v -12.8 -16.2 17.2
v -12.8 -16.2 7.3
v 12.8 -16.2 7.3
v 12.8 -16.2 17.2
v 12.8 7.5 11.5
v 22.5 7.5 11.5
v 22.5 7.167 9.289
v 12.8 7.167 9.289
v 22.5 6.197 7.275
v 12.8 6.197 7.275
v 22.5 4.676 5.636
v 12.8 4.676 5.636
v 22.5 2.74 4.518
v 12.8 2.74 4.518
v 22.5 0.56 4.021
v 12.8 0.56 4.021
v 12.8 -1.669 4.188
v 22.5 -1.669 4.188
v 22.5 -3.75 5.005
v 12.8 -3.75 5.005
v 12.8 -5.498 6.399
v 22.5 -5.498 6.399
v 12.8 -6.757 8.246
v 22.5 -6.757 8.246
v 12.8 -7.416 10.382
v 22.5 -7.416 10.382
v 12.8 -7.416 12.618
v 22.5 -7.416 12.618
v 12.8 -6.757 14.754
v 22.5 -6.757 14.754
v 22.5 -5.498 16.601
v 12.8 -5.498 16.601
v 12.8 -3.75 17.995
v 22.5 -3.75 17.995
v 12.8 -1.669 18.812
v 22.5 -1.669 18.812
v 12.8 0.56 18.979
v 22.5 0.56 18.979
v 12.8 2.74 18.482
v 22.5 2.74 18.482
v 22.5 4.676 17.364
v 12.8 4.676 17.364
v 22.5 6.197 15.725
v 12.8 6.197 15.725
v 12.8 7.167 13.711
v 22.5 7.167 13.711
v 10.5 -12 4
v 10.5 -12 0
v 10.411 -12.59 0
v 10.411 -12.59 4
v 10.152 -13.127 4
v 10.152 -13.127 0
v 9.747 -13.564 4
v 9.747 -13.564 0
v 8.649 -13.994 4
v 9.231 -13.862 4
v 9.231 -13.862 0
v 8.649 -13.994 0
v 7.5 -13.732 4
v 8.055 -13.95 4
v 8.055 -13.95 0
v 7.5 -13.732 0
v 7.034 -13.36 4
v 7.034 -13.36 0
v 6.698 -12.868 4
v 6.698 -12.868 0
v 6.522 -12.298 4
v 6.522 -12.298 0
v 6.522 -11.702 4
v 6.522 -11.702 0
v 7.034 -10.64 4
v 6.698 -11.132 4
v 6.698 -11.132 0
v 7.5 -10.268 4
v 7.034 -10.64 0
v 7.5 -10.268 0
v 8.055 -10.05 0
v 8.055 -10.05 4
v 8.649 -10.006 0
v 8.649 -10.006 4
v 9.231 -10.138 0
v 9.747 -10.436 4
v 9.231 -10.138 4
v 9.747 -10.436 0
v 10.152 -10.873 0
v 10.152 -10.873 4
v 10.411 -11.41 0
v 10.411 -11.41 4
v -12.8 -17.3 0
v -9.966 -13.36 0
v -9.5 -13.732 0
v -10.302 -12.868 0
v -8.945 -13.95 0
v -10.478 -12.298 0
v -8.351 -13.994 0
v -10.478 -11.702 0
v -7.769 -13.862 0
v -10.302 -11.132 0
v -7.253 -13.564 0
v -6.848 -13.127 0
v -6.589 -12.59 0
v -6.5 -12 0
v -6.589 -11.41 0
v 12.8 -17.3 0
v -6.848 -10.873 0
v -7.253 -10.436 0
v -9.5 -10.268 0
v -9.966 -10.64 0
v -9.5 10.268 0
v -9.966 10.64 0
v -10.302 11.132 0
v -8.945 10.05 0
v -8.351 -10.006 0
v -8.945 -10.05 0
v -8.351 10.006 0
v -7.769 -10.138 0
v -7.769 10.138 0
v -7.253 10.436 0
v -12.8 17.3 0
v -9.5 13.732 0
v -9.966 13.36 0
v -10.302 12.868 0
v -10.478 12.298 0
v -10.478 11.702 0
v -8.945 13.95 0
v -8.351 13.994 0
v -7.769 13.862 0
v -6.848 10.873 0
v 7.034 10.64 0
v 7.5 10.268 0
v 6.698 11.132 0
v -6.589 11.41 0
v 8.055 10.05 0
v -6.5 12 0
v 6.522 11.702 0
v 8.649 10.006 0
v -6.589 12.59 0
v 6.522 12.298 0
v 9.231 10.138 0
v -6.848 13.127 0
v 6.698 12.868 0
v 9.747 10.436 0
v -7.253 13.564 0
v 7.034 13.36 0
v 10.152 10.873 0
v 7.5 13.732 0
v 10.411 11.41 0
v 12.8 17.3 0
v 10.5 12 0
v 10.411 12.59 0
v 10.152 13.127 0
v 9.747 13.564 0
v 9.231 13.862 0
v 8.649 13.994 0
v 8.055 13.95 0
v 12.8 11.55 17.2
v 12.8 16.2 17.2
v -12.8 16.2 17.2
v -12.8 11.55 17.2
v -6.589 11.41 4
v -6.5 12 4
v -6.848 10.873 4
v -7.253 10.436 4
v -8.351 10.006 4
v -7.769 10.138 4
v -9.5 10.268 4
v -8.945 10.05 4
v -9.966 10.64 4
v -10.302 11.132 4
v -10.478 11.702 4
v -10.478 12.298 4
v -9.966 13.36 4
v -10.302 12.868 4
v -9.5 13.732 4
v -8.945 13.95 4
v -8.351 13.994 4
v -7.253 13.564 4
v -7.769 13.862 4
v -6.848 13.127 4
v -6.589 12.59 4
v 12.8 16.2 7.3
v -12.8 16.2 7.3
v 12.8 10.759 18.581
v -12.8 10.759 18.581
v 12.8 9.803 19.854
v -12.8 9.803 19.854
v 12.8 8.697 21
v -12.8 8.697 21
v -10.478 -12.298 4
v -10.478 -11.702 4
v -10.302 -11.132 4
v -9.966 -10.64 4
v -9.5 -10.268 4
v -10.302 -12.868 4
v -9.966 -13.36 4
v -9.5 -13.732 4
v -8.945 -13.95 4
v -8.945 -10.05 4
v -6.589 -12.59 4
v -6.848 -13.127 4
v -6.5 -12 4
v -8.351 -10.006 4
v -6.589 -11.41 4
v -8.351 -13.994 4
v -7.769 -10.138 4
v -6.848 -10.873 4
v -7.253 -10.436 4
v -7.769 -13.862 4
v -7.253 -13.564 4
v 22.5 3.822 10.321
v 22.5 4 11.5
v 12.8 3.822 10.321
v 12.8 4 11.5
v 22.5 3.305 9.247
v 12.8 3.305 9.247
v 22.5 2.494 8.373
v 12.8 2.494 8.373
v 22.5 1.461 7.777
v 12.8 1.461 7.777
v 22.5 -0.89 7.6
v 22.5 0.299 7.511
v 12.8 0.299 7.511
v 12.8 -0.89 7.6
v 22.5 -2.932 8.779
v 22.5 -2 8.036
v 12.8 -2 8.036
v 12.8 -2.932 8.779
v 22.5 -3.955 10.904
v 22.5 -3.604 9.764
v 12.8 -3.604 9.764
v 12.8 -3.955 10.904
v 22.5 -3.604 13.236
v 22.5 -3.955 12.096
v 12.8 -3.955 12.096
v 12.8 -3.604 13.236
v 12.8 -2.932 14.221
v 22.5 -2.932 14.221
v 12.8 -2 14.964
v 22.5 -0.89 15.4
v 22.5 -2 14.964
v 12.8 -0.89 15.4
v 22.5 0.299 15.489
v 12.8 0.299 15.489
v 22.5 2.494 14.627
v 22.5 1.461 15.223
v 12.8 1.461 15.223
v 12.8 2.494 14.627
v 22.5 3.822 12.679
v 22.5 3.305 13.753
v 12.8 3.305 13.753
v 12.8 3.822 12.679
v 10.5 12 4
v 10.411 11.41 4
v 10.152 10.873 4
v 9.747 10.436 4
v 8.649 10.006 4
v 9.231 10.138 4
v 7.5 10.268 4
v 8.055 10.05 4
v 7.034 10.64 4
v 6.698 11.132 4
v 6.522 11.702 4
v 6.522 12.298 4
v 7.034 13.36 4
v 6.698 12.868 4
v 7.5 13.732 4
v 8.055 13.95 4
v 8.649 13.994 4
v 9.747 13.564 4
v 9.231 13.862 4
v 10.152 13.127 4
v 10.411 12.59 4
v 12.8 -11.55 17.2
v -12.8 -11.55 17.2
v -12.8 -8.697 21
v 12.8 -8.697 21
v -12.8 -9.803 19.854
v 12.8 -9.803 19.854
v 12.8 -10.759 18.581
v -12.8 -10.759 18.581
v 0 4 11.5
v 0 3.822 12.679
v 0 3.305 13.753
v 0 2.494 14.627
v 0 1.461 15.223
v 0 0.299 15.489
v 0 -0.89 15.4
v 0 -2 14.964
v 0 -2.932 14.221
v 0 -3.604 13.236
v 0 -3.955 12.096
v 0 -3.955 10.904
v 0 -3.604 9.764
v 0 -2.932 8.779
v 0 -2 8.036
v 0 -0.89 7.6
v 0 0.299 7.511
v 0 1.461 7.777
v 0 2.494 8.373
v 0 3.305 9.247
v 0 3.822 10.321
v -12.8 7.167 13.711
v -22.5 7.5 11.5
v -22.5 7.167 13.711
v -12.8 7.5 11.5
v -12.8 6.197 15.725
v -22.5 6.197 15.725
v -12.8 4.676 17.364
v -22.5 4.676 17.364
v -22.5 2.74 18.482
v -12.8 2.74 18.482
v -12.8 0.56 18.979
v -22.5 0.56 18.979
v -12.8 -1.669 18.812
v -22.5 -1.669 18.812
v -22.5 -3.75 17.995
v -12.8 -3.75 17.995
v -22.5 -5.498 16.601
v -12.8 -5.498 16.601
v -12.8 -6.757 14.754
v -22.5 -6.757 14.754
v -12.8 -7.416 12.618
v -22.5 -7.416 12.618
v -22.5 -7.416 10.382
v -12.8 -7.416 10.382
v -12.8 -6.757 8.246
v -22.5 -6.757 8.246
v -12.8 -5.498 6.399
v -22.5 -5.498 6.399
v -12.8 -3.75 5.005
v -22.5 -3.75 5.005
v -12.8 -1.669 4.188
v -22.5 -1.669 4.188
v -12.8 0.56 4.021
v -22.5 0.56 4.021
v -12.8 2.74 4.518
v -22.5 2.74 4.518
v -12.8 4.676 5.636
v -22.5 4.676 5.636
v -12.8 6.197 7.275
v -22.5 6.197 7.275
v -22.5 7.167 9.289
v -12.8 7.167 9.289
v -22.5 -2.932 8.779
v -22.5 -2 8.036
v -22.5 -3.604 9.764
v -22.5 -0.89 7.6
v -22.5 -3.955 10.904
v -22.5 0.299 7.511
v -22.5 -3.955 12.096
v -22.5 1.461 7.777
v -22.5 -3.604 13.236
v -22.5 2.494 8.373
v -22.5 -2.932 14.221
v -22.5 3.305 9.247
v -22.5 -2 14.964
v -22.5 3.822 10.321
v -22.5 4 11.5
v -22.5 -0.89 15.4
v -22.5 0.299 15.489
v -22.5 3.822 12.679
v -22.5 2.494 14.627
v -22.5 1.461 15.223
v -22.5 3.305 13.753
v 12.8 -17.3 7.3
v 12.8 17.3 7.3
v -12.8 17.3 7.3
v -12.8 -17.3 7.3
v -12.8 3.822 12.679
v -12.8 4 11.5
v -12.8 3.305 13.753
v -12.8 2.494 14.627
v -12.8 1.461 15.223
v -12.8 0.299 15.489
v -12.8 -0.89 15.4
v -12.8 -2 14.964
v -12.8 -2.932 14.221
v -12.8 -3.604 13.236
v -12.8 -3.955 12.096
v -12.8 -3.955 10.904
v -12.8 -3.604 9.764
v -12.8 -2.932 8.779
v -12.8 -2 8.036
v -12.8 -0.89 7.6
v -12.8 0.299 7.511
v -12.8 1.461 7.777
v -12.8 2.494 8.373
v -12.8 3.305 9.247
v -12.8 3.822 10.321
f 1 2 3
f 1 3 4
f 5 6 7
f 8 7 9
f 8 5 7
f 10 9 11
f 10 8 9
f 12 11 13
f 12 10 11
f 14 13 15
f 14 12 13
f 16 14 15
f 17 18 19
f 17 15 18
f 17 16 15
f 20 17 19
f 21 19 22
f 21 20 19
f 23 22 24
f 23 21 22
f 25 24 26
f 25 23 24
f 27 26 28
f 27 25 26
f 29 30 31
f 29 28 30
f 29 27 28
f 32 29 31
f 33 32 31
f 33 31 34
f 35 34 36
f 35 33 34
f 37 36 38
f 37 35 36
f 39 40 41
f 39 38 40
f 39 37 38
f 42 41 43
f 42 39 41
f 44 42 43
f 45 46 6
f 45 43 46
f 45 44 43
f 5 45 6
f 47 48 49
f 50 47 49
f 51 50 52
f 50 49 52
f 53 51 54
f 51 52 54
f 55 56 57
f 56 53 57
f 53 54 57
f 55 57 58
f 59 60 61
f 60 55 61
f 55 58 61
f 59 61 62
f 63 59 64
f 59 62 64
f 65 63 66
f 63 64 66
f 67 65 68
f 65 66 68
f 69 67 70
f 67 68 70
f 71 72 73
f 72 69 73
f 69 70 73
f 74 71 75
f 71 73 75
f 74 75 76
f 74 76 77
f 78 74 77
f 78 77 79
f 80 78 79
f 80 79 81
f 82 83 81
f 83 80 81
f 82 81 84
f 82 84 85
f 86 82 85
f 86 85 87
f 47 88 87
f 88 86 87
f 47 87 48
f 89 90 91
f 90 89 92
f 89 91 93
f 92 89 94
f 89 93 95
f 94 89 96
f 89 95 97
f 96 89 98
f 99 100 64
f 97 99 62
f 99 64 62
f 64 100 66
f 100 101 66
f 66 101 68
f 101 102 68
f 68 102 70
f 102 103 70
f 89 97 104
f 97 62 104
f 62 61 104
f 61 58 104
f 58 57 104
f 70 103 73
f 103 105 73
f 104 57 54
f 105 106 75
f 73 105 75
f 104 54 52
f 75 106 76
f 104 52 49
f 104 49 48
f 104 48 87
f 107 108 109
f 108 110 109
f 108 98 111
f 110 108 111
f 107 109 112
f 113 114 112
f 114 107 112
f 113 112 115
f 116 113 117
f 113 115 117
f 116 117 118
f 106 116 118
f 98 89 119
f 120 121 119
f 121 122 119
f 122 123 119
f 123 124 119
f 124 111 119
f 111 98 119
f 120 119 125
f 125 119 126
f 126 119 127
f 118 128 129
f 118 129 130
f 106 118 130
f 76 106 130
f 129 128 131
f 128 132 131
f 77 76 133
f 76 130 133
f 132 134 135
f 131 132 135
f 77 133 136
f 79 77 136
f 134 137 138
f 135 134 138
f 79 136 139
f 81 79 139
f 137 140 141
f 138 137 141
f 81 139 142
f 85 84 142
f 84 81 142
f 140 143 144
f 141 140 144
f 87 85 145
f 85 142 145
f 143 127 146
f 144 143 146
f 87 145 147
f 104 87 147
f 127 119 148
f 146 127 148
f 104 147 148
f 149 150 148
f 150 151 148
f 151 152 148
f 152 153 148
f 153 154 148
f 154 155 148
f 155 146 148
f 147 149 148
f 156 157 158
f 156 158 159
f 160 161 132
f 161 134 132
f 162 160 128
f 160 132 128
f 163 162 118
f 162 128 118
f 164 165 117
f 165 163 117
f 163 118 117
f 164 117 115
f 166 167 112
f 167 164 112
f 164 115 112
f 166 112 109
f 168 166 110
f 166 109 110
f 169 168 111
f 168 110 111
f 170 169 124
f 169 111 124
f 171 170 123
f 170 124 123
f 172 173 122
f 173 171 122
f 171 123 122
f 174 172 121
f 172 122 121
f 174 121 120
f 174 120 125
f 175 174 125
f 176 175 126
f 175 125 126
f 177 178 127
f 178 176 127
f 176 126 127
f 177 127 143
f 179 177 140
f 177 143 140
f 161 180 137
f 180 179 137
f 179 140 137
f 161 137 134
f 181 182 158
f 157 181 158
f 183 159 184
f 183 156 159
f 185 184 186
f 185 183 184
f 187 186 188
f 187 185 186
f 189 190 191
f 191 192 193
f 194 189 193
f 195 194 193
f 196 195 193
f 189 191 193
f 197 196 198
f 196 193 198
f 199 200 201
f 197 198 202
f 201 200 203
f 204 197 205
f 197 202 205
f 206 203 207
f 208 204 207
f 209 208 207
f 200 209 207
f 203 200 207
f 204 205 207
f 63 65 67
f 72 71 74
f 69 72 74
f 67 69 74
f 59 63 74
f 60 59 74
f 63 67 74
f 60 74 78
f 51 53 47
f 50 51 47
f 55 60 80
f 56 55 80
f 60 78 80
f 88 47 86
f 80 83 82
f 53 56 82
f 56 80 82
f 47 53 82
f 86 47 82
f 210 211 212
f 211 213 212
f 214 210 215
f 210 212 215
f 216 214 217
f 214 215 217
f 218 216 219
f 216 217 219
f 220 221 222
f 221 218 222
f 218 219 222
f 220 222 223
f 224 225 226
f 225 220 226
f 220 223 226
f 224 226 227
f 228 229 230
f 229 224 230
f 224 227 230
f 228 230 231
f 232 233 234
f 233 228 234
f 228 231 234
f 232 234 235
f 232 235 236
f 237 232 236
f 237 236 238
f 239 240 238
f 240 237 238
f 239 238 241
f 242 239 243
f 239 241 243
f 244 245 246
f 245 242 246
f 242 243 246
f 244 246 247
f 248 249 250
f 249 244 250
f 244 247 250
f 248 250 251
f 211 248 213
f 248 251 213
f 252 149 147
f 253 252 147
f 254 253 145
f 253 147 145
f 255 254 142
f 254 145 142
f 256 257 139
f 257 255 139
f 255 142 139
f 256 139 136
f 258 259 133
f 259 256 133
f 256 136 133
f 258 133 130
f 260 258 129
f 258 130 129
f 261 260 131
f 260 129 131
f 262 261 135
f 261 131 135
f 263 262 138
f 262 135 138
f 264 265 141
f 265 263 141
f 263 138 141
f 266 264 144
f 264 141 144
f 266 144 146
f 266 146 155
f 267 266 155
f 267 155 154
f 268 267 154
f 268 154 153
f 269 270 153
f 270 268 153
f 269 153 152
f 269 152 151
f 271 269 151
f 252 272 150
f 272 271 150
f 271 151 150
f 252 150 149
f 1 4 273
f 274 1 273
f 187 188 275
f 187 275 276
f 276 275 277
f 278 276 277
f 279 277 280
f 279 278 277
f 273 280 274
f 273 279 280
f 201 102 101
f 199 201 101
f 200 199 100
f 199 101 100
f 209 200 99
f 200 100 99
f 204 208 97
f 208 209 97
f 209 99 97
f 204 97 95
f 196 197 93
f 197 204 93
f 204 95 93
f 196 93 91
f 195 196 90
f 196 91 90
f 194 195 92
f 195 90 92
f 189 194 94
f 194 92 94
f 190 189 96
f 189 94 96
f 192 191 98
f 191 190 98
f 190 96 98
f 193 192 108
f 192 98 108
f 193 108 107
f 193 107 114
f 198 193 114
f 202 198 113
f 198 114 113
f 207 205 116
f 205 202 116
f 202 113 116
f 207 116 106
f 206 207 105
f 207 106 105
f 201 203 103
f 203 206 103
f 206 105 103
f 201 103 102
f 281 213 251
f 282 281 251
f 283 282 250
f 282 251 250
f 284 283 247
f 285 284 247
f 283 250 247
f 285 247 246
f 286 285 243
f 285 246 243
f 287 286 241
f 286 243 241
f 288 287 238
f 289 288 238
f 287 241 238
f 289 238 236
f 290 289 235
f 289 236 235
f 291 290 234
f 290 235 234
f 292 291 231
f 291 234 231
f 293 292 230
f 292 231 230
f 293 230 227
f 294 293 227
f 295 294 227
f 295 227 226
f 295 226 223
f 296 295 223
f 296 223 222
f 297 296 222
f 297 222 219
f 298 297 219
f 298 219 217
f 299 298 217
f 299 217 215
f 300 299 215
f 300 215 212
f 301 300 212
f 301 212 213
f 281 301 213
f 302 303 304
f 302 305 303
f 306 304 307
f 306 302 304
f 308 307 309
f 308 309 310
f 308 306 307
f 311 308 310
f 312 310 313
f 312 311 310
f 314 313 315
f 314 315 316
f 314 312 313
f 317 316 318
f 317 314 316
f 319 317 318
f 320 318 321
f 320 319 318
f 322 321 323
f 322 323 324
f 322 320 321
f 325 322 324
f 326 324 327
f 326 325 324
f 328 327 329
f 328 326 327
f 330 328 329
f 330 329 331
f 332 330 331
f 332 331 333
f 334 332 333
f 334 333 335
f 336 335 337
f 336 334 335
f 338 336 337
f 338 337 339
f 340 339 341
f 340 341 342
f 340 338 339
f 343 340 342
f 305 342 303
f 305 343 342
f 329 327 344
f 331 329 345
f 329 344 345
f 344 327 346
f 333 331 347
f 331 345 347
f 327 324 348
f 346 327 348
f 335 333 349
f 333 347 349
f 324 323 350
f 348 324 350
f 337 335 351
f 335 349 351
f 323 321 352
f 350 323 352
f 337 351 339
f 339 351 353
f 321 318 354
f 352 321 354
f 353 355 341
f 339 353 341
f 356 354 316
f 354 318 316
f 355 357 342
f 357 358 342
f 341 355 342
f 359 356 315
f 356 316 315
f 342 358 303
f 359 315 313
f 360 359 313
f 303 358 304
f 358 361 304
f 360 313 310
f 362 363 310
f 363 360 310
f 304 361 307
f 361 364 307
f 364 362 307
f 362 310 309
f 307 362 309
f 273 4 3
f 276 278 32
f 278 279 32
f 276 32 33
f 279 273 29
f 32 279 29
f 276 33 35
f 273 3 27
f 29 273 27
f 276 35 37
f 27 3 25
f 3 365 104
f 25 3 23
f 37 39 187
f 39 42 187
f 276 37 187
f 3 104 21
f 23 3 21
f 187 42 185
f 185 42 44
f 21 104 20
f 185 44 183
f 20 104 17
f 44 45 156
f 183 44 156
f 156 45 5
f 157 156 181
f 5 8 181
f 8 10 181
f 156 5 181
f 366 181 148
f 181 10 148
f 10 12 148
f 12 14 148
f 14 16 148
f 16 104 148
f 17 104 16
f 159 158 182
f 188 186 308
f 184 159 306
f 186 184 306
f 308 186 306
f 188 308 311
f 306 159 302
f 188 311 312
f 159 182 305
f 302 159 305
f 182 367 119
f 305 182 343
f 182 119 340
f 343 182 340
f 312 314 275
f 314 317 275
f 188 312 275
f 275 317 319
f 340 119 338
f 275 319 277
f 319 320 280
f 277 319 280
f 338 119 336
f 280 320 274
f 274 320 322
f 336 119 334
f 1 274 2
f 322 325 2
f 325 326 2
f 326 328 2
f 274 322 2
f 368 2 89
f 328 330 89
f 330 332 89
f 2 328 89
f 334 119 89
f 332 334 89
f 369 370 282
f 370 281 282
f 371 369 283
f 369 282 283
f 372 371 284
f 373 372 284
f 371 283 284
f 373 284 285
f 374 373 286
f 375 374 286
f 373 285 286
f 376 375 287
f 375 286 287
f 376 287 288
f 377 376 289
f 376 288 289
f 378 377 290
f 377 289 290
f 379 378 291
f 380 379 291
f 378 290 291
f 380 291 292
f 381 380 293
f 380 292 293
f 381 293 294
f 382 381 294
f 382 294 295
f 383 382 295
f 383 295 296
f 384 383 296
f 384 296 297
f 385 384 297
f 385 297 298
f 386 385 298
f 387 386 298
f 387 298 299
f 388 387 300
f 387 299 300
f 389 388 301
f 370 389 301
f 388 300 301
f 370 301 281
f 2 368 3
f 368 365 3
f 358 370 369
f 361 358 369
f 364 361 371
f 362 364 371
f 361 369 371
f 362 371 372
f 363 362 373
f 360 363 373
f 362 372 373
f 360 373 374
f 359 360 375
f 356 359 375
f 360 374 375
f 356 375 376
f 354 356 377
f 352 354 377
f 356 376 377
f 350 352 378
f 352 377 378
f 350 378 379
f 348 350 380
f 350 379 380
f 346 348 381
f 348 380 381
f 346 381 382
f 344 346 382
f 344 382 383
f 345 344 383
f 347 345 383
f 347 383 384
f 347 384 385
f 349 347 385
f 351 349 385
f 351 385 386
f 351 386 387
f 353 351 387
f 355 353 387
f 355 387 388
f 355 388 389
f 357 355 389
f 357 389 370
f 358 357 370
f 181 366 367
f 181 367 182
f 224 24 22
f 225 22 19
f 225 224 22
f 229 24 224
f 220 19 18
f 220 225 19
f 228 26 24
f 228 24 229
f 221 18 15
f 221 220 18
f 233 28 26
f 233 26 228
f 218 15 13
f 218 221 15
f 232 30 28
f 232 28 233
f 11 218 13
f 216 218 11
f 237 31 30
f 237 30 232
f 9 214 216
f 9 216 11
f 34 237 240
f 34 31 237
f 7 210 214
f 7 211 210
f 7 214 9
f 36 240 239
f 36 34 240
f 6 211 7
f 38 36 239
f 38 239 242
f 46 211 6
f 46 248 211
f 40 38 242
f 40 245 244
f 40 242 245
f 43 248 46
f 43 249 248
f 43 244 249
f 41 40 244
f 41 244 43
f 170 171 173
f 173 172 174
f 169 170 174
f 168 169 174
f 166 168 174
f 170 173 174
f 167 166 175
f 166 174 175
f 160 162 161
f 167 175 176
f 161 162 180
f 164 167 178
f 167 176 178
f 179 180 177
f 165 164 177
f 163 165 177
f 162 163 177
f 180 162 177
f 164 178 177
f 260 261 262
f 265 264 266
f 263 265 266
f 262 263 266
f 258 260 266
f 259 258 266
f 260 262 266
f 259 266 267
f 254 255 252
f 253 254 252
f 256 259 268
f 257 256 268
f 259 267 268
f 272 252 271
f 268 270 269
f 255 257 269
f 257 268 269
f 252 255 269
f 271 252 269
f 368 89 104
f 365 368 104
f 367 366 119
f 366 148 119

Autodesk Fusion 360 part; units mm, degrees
sketch "Base" plane through (0, 0, 0) normal (0, 0, 1) x (1, 0, 0) in component "X Bearing Blocks"
  line L0 (12.8, 17.3) -> (-12.8, 17.3)
  line L1 (-12.8, 17.3) -> (-12.8, -17.3)
  line L2 (-12.8, -17.3) -> (12.8, -17.3)
  line L3 (12.8, -17.3) -> (12.8, 17.3)
  line L4 (12.8, 17.3) -> (-12.8, -17.3) construction
  line L5 (-12.8, 17.3) -> (12.8, -17.3) construction
  line L6 (-12.8, 0) -> (12.8, 0) construction
  line L7 (-12.8, 14.125) -> (12.8, 14.125)
  line L8 (-12.8, 9.875) -> (12.8, 9.875)
  line L9 (-12.8, 12) -> (12.8, 12) construction
  circle A0 centre (-8.5, 12) radius 2
  circle A1 centre (8.5, 12) radius 2
  line L10 (0, 17.3) -> (0, -17.3) construction
  line L11 (-12.8, -14.125) -> (12.8, -14.125)
  circle A2 centre (-8.5, -12) radius 2
  circle A3 centre (8.5, -12) radius 2
  line L12 (-12.8, -9.875) -> (12.8, -9.875)
  dimension "d484_1" = 25.6
  dimension "d485_1" = 34.6
  dimension "d489_1" = 4
  dimension "d490_1" = 4
  dimension "d491_1" = 12
  dimension "d492_1" = 17
  dimension "d493_1" = 8.5
  dimension "d495_1" = 2.125
  dimension "d496_1" = 2.125
extrude "Extrude1" add sketch "Base" along normal blind 21 contours L0 L1 L3 L7 | L1 L3 L7 L8 | L1 L3 L8 L12 | L1 L3 L11 L12 | L1 L2 L3 L11 | A0 | A1 | A2 | A3 in component "X Bearing Blocks"
sketch "Face" plane through (12.8, 0, 0) normal (1, 0, 0) x (0, 1, 0) in component "X Bearing Blocks"
  line L0 (-17.3, 0) -> (17.3, 0)
  line L1 (17.3, 0) -> (17.3, 21)
  line L2 (17.3, 21) -> (-17.3, 21)
  line L3 (-17.3, 21) -> (-17.3, 0)
  line L4 (0, 0) -> (0, 21) construction
  circle A0 centre (0, 11.5) radius 7.5
  circle A1 centre (0, 11.5) radius 4
  line L5 (-17.3, 0) -> (-17.3, 7.3)
  line L6 (-17.3, 7.3) -> (-16.2, 7.3)
  line L7 (-16.2, 7.3) -> (-16.2, 17.2)
  line L8 (-16.2, 17.2) -> (-11.55, 17.2)
  line L9 (17.3, 0) -> (17.3, 7.3)
  line L10 (17.3, 7.3) -> (16.2, 7.3)
  line L11 (16.2, 7.3) -> (16.2, 17.2)
  line L12 (16.2, 17.2) -> (11.55, 17.2)
  arc A2 (11.55, 17.2) -> (-11.55, 17.2) centre (0, 11.5) ccw
  dimension "d499_1" = 15
  dimension "d500_1" = 8
  dimension "d501_1" = 11.5
  dimension "d504_1" = 1.1
  dimension "d505_1" = 7.3
  dimension "d506_1" = 5.75
  dimension "d507_1" = 17.2
extrude "Extrude2" cut sketch "Face" against normal blind 25.6 contours L2 L3 L6 L7 L8 A2 | L1 L2 L10 L11 L12 A2 | A1 in component "X Bearing Blocks"
extrude "Extrude3" add sketch "Face" along normal mid plane 45 from surface at -12.8 contours A0 in component "X Bearing Blocks"
extrude "Extrude4" cut sketch "Base" along normal blind 4 contours A0 | A1 | A2 | A3 in component "X Bearing Blocks"
thread "Thread1" in component "X Bearing Blocks"
thread "Thread2" in component "X Bearing Blocks"
thread "Thread3" in component "X Bearing Blocks"
thread "Thread4" in component "X Bearing Blocks"
component "X Bearing Blocks" placed x (1, 0, 0) y (0, 1, 0) z (0, 0, 1) at (0, 0, 0)
equation "d197_1 = 4 mm"
equation "d198_1 = 6.00 mm"
equation "d199_1 = 6.00 mm"
equation "d200_1 = 4.00 mm"
equation "d201_1 = 12 mm"
equation "d202_1 = 90.0 deg"
equation "d203_1 = 12 mm"
equation "d204_1 = 90.0 deg"
equation "d205_1 = 12 mm"
equation "d206_1 = 90.0 deg"
equation "d207_1 = 51 mm"
equation "d209_1 = 51 mm"
equation "d210_1 = 12 mm"
equation "d211_1 = 90.0 deg"
equation "d212_1 = 30.0 mm"
equation "d213_1 = 30.00 mm"
equation "d214_1 = 12 mm"
equation "d215_1 = 90.0 deg"
equation "d216_1 = 12 mm"
equation "d217_1 = 90.0 deg"
equation "d218_1 = 2 mm"
equation "d225_1 = ( 3.6 / 2 ) * 1 mm"
equation "d227_1 = -1.5875 mm"
equation "d228_1 = 0.0 deg"
equation "d229_1 = 5.00 mm"
equation "d250_1 = 1.5875 mm"
equation "d251_1 = 0.0 deg"
equation "d253_1 = 21 mm + ( ( 39 / 2 ) * 1 mm )"
equation "d260_1 = 360.0 deg"
equation "d261_1 = -1.5875 mm"
equation "d262_1 = 0.0 deg"
equation "d284_1 = -1.588 mm"
equation "d285_1 = 0.0 deg"
equation "d286_1 = 0.00 mm"
equation "d287_1 = 1.588 mm"
equation "d288_1 = 0.0 deg"
equation "d301_1 = -1.588 mm"
equation "d302_1 = 0.0 deg"
equation "d342_1 = ( 17 / 2 ) * 1 mm"
equation "d343_1 = ( 17 / 2 ) * 1 mm"
equation "d386_1 = 0.00 mm"
equation "d387_1 = 19.7 mm"
equation "d388_1 = 0.0 deg"
equation "d389_1 = 0.00 mm"
equation "d390_1 = 6 mm"
equation "d391_1 = 0.0 deg"
equation "d400_1 = ( 92 / 2 ) * 1 mm"
equation "d407_1 = 0.00 mm"
equation "d408_1 = 9 mm"
equation "d409_1 = 0.0 deg"
equation "d410_1 = 1.588 mm"
equation "d411_1 = 0.0 deg"
equation "d433_1 = ( 92 / 2 ) * 1 mm"
equation "d448_1 = 0.00 mm"
equation "d449_1 = 0.00 mm"
equation "d450_1 = 0.00 mm"
equation "d451_1 = 0.0 deg"
equation "d452_1 = 0.00 mm"
equation "d453_1 = 0.00 mm"
equation "d454_1 = 0.00 mm"
equation "d455_1 = 0.0 deg"
equation "d456_1 = 90 deg"
equation "d457_1 = 0.00 mm"
equation "d458_1 = 0.00 mm"
equation "d459_1 = 0.00 mm"
equation "d460_1 = 0.00 mm"
equation "d461_1 = 0.00 mm"
equation "d462_1 = 0.00 mm"
equation "d463_1 = 0.0 deg"
equation "d464_1 = 0.00 mm"
equation "d465_1 = 0.00 mm"
equation "d466_1 = 0.00 mm"
equation "d467_1 = 0.0 deg"
equation "d468_1 = -90 deg"
equation "d469_1 = 0.00 mm"
equation "d470_1 = 0.00 mm"
equation "d471_1 = 0.00 mm"
equation "d491_1 = ( 24 / 2 ) * 1 mm"
equation "d493_1 = ( 17 / 2 ) * 1 mm"
equation "d495_1 = ( 4.25 / 2 ) * 1 mm"
equation "d496_1 = ( 4.25 / 2 ) * 1 mm"
equation "d497_1 = 21 mm"
equation "d498_1 = 0.0 deg"
equation "d501_1 = ( 15 / 2 ) * 1 mm + 4 mm"
equation "d508_1 = 0.0 deg"
equation "d509_1 = -25.60 mm"
equation "d510_1 = ( 45 / 2 ) * 1 mm"
equation "d511_1 = 0.0 deg"
equation "d512_1 = 0.00 mm"
equation "d513_1 = 4.00 mm"
equation "d514_1 = 0.0 deg"
equation "d515_1 = 0.00 mm"
equation "d516_1 = 0.00 mm"
equation "d517_1 = 0.00 mm"
equation "d518_1 = 0.0 deg"
equation "d519_1 = 0.00 mm"
equation "d520_1 = 0.00 mm"
equation "d521_1 = 0.00 mm"
equation "d522_1 = 0.0 deg"
equation "d523_1 = 90 deg"
equation "d524_1 = 0.00 mm"
equation "d525_1 = 0.00 mm"
equation "d526_1 = 0.00 mm"
equation "d527_1 = 0.00 mm"
equation "d528_1 = 0.00 mm"
equation "d529_1 = 0.00 mm"
equation "d530_1 = 0.0 deg"
equation "d531_1 = 0.00 mm"
equation "d532_1 = 0.00 mm"
equation "d533_1 = 0.00 mm"
equation "d534_1 = 0.0 deg"
equation "d535_1 = 90 deg"
equation "d536_1 = 0.00 mm"
equation "d537_1 = 0.00 mm"
equation "d538_1 = 0.00 mm"
equation "d539_1 = 0.00 mm"
equation "d540_1 = 0.00 mm"
equation "d541_1 = 0.00 mm"
equation "d542_1 = 0.0 deg"
equation "d543_1 = 0.00 mm"
equation "d544_1 = 0.00 mm"
equation "d545_1 = 0.00 mm"
equation "d546_1 = 0.0 deg"
equation "d547_1 = 0.0 deg"
equation "d548_1 = 0.00 mm"
equation "d549_1 = 0.00 mm"
equation "d550_1 = 0.00 mm"
equation "d587_1 = 0.00 mm"
equation "d588_1 = 0.00 mm"
equation "d589_1 = 0.00 mm"
equation "d590_1 = 0.0 deg"
equation "d491_1 = ( 24 / 2 ) * 1 mm"
equation "d493_1 = ( 17 / 2 ) * 1 mm"
equation "d495_1 = ( 4.25 / 2 ) * 1 mm"
equation "d496_1 = ( 4.25 / 2 ) * 1 mm"
equation "d501_1 = ( 15 / 2 ) * 1 mm + 4 mm"
equation "d510_1 = ( 45 / 2 ) * 1 mm"
